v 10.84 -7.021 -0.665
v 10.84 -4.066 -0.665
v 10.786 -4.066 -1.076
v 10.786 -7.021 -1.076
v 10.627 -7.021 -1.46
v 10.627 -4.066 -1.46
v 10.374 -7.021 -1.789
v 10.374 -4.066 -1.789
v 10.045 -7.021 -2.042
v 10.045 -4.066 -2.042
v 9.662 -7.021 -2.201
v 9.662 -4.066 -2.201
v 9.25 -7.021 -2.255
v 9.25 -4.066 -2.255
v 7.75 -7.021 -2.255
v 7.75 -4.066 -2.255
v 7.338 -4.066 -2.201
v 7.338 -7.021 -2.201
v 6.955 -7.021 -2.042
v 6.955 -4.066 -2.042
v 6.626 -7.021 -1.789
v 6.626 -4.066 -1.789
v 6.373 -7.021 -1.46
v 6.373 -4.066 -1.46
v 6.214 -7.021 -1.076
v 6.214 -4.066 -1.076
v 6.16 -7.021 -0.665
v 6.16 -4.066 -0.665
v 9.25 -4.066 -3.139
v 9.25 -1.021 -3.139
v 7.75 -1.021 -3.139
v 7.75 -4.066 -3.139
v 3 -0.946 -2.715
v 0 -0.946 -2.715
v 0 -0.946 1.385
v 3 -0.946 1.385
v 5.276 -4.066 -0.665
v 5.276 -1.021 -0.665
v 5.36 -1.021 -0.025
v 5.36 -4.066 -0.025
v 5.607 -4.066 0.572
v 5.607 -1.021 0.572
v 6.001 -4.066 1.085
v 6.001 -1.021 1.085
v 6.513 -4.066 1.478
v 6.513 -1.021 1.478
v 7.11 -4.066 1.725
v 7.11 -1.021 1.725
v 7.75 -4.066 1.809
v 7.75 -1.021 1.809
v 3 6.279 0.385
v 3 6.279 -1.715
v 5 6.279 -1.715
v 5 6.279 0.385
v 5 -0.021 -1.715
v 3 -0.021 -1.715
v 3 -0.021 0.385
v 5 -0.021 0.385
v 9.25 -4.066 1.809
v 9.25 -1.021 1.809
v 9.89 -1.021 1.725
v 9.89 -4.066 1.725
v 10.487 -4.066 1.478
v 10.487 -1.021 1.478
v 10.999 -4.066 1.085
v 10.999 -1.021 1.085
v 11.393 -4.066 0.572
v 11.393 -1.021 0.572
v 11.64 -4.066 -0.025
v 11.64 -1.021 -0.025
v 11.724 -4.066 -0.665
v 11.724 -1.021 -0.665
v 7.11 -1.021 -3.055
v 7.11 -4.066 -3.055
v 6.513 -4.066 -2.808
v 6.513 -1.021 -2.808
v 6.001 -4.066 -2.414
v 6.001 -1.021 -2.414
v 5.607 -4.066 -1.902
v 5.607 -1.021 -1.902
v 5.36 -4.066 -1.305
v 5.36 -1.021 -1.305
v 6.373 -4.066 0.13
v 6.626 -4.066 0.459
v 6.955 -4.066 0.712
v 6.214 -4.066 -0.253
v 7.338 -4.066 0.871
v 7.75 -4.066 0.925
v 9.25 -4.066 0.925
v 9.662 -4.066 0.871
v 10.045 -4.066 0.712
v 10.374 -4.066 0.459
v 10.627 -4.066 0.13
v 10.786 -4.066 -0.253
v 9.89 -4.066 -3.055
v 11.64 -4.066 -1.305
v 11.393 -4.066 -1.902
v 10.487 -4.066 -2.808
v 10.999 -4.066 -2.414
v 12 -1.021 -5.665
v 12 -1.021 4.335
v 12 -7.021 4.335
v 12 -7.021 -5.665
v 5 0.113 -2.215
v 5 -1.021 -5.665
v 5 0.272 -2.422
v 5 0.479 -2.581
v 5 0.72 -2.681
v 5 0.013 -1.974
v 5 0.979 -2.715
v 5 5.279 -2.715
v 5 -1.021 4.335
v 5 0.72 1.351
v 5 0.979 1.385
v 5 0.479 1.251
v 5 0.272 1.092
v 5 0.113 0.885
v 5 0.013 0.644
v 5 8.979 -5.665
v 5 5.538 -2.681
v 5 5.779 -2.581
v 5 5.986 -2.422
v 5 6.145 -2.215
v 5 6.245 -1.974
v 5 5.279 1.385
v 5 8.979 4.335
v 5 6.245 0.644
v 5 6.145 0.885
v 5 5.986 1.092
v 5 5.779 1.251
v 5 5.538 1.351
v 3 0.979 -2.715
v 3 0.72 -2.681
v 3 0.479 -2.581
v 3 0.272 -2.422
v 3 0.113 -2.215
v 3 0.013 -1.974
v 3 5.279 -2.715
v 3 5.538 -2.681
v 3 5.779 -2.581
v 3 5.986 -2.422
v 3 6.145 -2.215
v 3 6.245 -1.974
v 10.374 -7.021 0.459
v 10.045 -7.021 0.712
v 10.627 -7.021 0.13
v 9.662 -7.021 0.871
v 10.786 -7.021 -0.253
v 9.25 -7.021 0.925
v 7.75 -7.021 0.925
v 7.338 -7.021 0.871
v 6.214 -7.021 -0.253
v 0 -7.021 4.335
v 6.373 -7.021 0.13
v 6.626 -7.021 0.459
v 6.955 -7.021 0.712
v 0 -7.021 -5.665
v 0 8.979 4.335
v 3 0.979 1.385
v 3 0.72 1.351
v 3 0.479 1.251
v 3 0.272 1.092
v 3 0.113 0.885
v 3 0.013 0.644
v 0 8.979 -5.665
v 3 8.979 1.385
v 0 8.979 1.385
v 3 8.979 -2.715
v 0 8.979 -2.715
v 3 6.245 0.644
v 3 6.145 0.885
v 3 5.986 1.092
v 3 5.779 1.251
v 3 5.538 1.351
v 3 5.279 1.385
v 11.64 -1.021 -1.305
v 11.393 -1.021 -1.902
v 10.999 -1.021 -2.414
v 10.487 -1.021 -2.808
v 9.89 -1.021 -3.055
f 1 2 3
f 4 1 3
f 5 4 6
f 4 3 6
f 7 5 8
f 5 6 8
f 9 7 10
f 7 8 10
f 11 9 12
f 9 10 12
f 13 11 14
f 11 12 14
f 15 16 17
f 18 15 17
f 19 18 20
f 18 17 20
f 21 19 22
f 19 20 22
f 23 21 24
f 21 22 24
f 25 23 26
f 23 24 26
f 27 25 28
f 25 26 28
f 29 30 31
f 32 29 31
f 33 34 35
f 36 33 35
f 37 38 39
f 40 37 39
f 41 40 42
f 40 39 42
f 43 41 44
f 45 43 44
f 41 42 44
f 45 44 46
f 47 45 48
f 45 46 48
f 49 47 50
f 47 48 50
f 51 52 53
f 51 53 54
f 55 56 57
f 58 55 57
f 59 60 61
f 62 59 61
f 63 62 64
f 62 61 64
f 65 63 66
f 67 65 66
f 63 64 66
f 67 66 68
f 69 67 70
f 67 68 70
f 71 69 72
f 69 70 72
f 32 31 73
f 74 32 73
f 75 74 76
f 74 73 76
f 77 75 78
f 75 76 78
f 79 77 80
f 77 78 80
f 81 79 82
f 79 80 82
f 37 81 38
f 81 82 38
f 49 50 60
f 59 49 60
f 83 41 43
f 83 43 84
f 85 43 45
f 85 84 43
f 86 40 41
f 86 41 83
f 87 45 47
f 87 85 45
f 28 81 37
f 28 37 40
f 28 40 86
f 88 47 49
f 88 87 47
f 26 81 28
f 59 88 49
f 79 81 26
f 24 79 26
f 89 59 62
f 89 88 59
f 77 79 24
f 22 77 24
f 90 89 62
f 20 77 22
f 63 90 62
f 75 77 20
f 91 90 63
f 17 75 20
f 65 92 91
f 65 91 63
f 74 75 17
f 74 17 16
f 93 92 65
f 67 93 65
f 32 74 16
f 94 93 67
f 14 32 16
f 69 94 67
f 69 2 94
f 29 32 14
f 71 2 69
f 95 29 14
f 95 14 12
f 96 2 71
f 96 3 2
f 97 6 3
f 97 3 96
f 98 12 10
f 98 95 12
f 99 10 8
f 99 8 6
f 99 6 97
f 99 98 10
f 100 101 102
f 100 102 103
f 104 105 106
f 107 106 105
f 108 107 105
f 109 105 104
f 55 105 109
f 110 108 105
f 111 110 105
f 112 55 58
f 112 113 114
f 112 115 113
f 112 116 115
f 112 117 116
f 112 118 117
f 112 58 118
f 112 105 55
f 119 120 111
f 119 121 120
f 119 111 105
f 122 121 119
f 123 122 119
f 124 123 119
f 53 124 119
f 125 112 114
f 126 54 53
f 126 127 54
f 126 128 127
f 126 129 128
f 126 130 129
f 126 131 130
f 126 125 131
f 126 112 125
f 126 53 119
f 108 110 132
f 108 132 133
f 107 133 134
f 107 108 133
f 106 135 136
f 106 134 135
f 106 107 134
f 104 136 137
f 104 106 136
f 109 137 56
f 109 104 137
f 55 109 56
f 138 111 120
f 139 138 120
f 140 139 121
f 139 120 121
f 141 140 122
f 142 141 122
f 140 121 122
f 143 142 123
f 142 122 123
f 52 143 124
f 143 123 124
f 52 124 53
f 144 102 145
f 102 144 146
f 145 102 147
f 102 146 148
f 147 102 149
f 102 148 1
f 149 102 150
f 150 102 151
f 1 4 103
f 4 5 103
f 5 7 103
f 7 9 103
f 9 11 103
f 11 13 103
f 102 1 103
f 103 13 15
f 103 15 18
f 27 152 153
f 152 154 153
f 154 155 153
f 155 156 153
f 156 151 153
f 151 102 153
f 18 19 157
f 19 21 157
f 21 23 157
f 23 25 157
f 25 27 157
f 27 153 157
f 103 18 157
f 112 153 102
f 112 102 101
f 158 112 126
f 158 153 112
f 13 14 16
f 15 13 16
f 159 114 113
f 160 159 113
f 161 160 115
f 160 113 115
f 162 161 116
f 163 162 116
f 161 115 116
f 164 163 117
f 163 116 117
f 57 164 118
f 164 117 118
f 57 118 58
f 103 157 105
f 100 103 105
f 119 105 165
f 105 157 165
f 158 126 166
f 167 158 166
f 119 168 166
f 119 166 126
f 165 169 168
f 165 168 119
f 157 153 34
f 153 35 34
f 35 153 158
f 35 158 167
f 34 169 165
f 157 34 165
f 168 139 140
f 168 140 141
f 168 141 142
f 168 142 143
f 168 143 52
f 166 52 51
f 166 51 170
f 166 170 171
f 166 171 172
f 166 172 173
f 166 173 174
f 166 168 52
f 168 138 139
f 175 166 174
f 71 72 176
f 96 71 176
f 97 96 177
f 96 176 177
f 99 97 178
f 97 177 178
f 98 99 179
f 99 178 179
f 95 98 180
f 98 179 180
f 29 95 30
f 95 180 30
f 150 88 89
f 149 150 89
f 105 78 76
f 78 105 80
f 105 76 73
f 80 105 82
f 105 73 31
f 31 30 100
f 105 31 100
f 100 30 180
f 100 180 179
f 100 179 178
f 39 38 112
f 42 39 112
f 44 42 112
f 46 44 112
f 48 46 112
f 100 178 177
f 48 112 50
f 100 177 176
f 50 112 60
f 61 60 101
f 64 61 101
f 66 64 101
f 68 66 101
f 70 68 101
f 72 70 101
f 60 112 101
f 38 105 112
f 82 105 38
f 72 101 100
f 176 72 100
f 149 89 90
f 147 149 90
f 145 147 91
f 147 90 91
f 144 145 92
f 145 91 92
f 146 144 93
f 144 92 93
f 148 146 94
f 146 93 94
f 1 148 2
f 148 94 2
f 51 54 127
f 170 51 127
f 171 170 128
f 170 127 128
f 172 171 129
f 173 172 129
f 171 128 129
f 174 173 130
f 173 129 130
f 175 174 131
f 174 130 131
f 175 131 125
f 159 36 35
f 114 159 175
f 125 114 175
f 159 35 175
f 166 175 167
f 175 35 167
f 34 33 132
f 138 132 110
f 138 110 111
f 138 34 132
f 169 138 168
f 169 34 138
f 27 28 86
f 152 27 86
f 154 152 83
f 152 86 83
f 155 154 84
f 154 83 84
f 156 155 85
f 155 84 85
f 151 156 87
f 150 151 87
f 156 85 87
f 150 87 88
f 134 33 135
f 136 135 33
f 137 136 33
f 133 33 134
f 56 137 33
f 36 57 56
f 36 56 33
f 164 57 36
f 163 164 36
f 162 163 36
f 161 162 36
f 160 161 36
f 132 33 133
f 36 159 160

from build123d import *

# Parameters (mm, degrees)
SKETCH1_W           = 10
SKETCH1_H           = 16
BOSS_EXTRUDE1_DEPTH = 12
SKETCH2_W           = 7
SKETCH2_H           = 10
CUT_EXTRUDE1_DEPTH  = 19.01714389
CUT_EXTRUDE2_DEPTH  = 17.615986871
CUT_EXTRUDE3_DEPTH  = 3.0448
SKETCH4_W           = 4.1
SKETCH4_H           = 6.3
CUT_EXTRUDE4_DEPTH  = 17.022125129
FILLET2_R           = 1
SKETCH4_6_W         = 4.1
SKETCH4_6_H         = 9.924876291
CUT_EXTRUDE7_DEPTH  = 3


with BuildPart() as part:
    # Sketch1 → Boss-Extrude1 (new body)
    with BuildSketch(Plane(origin=(0, 0, 0), x_dir=(0, 0, -1), z_dir=(1, 0, 0))):
        with Locations((0.664893617, 0.978723404)):
            Rectangle(SKETCH1_W, SKETCH1_H)
    extrude(amount=BOSS_EXTRUDE1_DEPTH)

    # Sketch2 → Cut-Extrude1 (cut, through all)
    with BuildSketch(Plane.XY.offset(4.335106383)):
        with Locations((8.5, 3.978723404)):
            Rectangle(SKETCH2_W, SKETCH2_H)
    extrude(amount=-CUT_EXTRUDE1_DEPTH, mode=Mode.SUBTRACT)

    # Sketch3 → Cut-Extrude2 (cut, through all)
    with BuildSketch(Plane(origin=(0, -1.021276596, 0), x_dir=(1, 0, 0), z_dir=(0, 1, 0))):
        with BuildLine():
            ThreePointArc((7.75, 2.254893617), (6.16, 0.664893617), (7.75, -0.925106383))
            Line((7.75, -0.925106383), (9.25, -0.925106383))
            ThreePointArc((9.25, -0.925106383), (10.84, 0.664893617), (9.25, 2.254893617))
            Line((9.25, 2.254893617), (7.75, 2.254893617))
        make_face()
    extrude(amount=-CUT_EXTRUDE2_DEPTH, mode=Mode.SUBTRACT)

    # Sketch3<3> → Cut-Extrude3 (cut)
    with BuildSketch(Plane(origin=(0, -1.021276596, 0), x_dir=(1, 0, 0), z_dir=(0, 1, 0))):
        with BuildLine():
            ThreePointArc((7.75, 3.138993617), (5.2759, 0.664893617), (7.75, -1.809206383))
            Line((7.75, -1.809206383), (9.25, -1.809206383))
            ThreePointArc((9.25, -1.809206383), (11.7241, 0.664893617), (9.25, 3.138993617))
            Line((9.25, 3.138993617), (7.75, 3.138993617))
        make_face()
        with BuildLine():
            ThreePointArc((9.25, 2.254893617), (10.84, 0.664893617), (9.25, -0.925106383))
            Line((9.25, -0.925106383), (7.75, -0.925106383))
            ThreePointArc((7.75, -0.925106383), (6.16, 0.664893617), (7.75, 2.254893617))
            Line((7.75, 2.254893617), (9.25, 2.254893617))
        make_face(mode=Mode.SUBTRACT)
    extrude(amount=-CUT_EXTRUDE3_DEPTH, mode=Mode.SUBTRACT)

    # Sketch4 → Cut-Extrude4 (cut, through all)
    with BuildSketch(Plane.ZY):
        with Locations((-0.664893617, 3.128723404)):
            Rectangle(SKETCH4_W, SKETCH4_H)
    extrude(amount=-CUT_EXTRUDE4_DEPTH, mode=Mode.SUBTRACT)

    # Fillet2
    fillet2_edges = [part.edges().sort_by_distance(p)[0] for p in [
        (2.5, -0.021276596, 1.385106383),
        (2.5, 6.278723404, 1.385106383),
        (2.5, 6.278723404, -2.714893617),
        (2.5, -0.021276596, -2.714893617),
    ]]
    fillet(fillet2_edges, radius=FILLET2_R)

    # Sketch4<6> → Cut-Extrude7 (cut)
    with BuildSketch(Plane.ZY):
        with Locations((-0.664893617, 4.016285258)):
            Rectangle(SKETCH4_6_W, SKETCH4_6_H)
    extrude(amount=-CUT_EXTRUDE7_DEPTH, mode=Mode.SUBTRACT)


solid = part.part
